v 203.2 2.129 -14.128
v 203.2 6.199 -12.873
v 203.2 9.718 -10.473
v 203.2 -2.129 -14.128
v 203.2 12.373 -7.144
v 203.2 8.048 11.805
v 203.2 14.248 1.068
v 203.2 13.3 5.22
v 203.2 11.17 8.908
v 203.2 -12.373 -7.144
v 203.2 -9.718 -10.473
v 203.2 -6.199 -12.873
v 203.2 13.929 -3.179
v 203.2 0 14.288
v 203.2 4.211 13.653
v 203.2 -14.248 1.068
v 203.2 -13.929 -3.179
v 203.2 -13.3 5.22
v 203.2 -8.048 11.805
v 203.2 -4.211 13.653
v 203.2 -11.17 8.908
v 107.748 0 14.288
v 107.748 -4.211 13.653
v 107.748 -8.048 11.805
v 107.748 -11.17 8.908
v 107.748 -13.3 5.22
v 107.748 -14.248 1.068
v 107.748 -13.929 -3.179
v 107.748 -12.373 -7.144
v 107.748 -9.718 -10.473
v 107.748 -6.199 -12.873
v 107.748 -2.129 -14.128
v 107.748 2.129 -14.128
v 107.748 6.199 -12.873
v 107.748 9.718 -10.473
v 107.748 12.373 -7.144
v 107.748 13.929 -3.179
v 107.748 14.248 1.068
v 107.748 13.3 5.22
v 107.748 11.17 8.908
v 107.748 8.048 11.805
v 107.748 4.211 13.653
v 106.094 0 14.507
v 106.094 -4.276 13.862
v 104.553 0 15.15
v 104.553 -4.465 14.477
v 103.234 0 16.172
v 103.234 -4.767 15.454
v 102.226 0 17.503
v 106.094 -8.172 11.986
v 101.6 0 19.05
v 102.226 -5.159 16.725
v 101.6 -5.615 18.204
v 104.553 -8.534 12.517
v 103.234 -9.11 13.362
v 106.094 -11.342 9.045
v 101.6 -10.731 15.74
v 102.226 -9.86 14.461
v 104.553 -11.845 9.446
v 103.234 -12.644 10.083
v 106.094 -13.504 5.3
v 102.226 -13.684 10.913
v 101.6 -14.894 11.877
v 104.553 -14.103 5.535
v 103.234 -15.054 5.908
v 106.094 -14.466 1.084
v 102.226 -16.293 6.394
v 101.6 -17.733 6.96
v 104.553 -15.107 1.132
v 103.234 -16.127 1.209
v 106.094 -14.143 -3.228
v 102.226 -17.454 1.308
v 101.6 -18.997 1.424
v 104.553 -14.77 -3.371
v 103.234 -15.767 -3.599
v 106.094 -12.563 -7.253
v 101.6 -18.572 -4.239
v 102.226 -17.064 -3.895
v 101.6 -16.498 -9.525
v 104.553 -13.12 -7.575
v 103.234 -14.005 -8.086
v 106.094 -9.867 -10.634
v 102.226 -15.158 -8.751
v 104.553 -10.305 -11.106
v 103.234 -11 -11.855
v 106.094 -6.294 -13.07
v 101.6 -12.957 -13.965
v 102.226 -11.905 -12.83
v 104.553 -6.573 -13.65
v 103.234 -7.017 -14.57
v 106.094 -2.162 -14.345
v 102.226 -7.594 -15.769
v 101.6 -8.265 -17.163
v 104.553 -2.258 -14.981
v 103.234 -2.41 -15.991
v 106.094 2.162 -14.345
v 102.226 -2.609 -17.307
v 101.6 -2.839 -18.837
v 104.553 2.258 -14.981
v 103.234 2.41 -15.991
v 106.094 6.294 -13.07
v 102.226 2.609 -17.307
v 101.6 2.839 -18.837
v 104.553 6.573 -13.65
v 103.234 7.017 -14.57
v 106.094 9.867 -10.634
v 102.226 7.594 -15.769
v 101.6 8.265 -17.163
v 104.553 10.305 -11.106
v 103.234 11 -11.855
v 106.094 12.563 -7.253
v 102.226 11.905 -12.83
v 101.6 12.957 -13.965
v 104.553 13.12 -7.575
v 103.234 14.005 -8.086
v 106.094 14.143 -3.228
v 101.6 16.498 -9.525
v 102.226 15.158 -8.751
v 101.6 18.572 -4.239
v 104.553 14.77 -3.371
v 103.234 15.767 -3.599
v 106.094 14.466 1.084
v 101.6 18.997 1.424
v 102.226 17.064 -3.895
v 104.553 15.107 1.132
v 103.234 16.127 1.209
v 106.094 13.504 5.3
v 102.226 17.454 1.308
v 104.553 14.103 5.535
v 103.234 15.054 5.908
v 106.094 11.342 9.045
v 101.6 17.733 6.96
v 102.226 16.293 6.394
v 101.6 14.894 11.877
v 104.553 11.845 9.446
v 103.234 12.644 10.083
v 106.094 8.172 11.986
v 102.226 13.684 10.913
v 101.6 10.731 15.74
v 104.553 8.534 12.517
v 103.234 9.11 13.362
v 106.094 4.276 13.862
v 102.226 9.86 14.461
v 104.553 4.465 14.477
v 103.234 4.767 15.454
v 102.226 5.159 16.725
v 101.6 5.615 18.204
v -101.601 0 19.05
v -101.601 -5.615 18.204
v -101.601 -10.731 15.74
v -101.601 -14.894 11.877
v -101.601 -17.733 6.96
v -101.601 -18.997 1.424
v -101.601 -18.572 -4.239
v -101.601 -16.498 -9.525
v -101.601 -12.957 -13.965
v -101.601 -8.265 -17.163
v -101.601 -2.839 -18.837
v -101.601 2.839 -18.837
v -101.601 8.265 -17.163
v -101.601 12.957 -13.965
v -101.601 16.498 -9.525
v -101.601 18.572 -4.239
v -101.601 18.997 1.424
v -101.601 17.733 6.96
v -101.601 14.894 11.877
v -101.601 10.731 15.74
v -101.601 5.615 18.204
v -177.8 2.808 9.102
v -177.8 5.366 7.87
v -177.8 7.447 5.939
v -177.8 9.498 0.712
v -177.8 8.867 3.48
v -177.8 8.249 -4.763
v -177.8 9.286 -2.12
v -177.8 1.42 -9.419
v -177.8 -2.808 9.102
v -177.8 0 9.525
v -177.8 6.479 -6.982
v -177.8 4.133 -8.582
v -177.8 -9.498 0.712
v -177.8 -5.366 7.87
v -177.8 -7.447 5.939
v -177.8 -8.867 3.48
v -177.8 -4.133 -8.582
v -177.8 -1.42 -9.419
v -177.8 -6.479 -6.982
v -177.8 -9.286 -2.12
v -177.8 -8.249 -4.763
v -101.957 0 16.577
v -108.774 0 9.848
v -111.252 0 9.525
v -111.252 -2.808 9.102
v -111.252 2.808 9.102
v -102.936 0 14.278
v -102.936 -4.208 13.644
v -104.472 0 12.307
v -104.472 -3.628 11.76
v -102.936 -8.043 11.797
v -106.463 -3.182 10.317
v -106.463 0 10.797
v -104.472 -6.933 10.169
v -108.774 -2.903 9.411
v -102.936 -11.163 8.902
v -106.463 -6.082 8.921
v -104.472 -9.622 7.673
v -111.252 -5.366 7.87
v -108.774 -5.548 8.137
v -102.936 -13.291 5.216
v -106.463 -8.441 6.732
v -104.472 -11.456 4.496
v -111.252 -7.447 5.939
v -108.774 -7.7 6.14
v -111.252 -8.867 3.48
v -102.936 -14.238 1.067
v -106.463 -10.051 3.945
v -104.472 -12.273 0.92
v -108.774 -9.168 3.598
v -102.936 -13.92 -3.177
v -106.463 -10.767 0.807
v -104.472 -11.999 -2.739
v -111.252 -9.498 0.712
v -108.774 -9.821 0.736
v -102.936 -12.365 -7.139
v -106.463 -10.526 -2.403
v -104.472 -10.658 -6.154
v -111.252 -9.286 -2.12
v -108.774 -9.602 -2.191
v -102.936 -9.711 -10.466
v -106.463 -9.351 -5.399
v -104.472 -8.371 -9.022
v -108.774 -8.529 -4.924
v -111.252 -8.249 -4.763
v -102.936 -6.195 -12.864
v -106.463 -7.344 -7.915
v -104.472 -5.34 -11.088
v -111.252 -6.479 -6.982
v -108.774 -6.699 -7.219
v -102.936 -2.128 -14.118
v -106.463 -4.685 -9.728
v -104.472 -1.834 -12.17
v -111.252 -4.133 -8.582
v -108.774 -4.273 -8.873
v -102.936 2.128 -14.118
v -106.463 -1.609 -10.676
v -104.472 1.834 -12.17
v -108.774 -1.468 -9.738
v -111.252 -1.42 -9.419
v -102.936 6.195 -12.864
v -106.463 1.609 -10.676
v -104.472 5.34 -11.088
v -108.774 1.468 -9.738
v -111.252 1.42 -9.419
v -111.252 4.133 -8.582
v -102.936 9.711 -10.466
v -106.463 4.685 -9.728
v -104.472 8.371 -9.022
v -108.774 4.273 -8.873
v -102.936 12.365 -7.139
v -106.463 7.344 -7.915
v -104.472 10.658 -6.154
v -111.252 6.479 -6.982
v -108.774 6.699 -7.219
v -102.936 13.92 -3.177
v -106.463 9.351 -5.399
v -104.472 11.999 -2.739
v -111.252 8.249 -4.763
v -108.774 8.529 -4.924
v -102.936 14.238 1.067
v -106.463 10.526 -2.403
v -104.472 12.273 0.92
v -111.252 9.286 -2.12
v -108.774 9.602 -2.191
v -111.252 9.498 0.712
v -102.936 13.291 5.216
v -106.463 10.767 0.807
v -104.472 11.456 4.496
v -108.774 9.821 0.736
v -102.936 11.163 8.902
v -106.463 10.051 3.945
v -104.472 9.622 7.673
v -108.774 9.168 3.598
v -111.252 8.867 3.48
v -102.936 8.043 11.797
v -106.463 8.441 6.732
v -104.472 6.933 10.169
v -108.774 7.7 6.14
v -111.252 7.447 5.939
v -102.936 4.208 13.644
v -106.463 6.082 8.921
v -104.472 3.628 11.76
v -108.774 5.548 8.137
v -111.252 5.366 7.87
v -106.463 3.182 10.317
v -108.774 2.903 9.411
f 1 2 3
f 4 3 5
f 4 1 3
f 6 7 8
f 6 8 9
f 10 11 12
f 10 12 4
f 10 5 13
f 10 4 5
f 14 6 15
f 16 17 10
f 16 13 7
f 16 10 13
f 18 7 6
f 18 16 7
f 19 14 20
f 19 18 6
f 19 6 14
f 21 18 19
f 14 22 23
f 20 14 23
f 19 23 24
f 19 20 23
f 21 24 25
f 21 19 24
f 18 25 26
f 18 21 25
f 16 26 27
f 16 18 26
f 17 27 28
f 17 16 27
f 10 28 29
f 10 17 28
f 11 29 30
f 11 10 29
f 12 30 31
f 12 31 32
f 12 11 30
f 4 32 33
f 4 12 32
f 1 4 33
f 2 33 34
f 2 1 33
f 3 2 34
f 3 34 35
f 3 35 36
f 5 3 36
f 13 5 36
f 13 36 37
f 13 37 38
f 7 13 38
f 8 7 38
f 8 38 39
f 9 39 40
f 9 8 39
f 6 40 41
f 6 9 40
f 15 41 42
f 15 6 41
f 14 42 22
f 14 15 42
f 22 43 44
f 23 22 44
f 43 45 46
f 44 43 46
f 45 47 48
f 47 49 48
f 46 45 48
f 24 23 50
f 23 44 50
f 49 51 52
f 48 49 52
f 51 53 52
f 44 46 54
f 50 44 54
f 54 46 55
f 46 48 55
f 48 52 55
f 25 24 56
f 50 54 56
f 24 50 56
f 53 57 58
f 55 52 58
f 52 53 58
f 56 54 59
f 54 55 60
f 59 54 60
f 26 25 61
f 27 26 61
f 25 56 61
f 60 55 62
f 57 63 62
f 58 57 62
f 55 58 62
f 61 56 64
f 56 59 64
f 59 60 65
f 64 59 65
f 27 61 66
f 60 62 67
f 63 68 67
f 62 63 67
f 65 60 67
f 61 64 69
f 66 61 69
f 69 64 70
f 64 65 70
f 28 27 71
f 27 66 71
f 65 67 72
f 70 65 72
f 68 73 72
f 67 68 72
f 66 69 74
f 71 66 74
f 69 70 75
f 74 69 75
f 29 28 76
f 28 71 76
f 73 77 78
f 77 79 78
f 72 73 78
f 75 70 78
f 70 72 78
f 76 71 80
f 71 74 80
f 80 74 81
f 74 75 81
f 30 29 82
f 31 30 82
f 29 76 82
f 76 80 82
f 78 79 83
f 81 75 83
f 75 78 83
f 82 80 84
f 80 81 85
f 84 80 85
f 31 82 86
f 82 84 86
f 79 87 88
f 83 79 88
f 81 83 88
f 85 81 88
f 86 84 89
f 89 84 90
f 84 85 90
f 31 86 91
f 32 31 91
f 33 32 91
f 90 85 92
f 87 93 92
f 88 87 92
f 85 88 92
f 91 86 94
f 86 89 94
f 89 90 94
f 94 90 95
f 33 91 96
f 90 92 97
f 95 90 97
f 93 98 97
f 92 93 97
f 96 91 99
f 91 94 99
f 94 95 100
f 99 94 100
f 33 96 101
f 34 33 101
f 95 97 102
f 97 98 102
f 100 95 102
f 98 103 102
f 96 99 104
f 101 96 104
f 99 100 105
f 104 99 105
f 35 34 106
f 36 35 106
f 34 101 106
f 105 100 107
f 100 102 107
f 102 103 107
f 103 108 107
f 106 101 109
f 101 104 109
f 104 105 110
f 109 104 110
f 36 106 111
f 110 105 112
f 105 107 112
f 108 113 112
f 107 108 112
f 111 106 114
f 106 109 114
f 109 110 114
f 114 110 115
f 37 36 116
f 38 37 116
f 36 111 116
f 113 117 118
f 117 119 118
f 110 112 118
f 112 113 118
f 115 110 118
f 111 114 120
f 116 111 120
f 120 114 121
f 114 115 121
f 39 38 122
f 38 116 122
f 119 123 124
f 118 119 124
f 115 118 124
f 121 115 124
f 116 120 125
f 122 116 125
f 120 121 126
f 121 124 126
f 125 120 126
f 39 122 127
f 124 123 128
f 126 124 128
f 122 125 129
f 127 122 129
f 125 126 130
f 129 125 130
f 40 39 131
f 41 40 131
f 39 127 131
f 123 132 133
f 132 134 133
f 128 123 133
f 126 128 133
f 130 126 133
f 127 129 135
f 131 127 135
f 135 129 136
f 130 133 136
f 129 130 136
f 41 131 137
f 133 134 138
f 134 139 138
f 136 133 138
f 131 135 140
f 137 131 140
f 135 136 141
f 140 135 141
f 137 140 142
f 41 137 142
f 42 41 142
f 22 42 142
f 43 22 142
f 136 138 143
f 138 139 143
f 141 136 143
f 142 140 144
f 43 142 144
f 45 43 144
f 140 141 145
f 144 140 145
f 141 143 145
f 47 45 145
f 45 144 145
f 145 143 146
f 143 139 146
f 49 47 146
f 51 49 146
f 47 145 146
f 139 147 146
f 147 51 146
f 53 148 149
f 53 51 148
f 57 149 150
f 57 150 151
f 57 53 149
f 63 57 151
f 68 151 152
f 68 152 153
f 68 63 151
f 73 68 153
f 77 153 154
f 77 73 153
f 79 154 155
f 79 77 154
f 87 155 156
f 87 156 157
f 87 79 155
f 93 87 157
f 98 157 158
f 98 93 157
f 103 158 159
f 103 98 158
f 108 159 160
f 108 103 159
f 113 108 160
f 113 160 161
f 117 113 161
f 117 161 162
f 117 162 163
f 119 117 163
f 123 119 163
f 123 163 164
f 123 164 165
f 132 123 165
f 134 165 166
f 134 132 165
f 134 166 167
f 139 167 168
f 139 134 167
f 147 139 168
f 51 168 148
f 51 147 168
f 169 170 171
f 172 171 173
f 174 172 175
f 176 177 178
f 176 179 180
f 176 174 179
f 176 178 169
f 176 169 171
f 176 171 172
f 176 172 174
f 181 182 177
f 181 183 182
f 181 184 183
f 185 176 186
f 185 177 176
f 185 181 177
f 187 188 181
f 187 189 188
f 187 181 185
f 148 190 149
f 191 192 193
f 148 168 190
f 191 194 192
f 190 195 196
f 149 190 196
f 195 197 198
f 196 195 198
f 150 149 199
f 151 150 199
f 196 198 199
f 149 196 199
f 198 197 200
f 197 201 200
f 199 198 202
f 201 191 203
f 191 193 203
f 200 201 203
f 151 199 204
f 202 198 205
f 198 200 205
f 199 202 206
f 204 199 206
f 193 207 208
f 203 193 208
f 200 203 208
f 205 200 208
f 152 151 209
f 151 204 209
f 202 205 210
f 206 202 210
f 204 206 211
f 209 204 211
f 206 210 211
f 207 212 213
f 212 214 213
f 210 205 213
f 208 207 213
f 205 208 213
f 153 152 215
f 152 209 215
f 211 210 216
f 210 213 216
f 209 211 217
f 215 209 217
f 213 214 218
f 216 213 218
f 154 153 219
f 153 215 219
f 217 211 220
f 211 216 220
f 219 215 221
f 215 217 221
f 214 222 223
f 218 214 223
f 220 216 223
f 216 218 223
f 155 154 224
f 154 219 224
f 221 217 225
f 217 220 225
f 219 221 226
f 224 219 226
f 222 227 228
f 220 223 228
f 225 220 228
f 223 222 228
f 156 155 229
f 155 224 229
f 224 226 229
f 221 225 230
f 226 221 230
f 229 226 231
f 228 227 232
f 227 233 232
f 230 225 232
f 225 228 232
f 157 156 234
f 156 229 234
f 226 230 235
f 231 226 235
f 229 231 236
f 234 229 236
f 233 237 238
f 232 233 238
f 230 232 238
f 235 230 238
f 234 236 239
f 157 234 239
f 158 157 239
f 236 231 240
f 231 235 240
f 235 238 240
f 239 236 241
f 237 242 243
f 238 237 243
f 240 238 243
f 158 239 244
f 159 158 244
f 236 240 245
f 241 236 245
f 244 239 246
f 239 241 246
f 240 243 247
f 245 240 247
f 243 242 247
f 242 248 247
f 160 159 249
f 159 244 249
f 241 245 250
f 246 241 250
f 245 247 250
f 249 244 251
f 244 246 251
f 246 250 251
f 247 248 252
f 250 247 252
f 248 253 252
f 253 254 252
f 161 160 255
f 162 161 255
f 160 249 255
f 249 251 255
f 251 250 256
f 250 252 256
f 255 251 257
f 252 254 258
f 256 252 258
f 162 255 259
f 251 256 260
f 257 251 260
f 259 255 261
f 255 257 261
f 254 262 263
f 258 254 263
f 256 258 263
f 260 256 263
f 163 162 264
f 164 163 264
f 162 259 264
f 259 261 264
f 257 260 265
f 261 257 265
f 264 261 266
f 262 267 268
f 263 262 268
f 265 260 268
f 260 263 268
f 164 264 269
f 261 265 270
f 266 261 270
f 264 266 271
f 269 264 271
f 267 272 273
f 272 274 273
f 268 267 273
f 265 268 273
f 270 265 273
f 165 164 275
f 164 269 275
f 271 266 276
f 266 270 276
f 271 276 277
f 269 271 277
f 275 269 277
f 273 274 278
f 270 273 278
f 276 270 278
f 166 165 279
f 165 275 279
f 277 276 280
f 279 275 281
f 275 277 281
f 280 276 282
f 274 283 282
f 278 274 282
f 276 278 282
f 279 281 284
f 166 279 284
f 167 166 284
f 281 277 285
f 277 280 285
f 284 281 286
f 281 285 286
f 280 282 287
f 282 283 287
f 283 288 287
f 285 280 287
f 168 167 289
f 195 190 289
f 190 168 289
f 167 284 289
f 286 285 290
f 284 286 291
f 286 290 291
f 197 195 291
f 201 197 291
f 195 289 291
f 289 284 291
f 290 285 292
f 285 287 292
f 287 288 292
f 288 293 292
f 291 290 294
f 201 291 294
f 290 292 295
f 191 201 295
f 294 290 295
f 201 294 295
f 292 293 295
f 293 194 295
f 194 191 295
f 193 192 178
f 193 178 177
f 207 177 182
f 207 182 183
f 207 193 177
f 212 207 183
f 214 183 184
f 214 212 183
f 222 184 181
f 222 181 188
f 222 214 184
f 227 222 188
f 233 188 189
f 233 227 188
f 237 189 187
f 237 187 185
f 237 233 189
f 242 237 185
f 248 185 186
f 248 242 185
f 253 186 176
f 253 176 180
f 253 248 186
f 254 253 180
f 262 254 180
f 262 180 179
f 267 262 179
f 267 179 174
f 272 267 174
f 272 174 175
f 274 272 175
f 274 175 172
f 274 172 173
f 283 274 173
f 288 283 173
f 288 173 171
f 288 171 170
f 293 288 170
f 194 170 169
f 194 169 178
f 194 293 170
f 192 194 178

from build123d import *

# Parameters (mm, degrees)
FILLET1_R = 9.652
FILLET2_R = 6.35


with BuildPart() as part:
    # Sketch1 → Revolve3 (revolve)
    with BuildSketch(Plane.XY, mode=Mode.PRIVATE) as revolve3_sk:
        Polygon((-101.6, 19.05), (101.6, 19.05), (101.6, 14.2875), (203.2, 14.2875), (203.2, 0), (-177.8, 0), (-177.8, 9.525), (-101.6, 9.525), align=None)
    revolve(revolve3_sk.sketch.rotate(Axis((-177.8, 0, 0), (1, 0, 0)), 90), axis=Axis((-177.8, 0, 0), (1, 0, 0)))

    # Fillet1
    # the kernel refuses this fillet: 9.652 mm, written as the material it adds along each edge
    with BuildSketch(Plane(origin=(-101.6, 0, 0), x_dir=(0, 0, 1), z_dir=(0, 1, 0))) as fillet1_piece_1_section:
        with BuildLine():
            CenterArc((9.525 + FILLET1_R, -FILLET1_R), FILLET1_R, 90, 90)
            Line((9.525 + FILLET1_R, 0), (9.525, 0))
            Line((9.525, 0), (9.525, -FILLET1_R))
        make_face()
    fillet1_piece_1 = revolve(axis=Axis((-101.6, 0, 0), (1, 0, 0)), mode=Mode.PRIVATE)
    fillet1_piece_1 = fillet1_piece_1 & Plane(origin=(-104.387487572, 0, 0), x_dir=(0, 0, 1), z_dir=(1, 0, 0)) * Cylinder(19.05, 77, mode=Mode.PRIVATE)
    add(fillet1_piece_1)

    # Fillet2
    # the kernel refuses this fillet: 6.35 mm, written as the material it adds along each edge
    with BuildSketch(Plane(origin=(101.6, 0, 0), x_dir=(0, 0, 1), z_dir=(0, 1, 0))) as fillet2_piece_1:
        with BuildLine():
            CenterArc((20.6375, 6.148361062), FILLET2_R, 180, 75.522487814)
            Line((14.2875, 6.148361062), (14.1605, 6.148361062))
            Line((14.1605, 6.148361062), (14.1605, 0))
            Line((14.1605, 0), (14.2875, -0.127))
            ThreePointArc((14.2875, -0.127), (16.66875, -0.127), (19.01825, -0.122967221))
            Line((19.01825, -0.122967221), (19.05, 0))
        make_face()
    revolve(axis=Axis((101.6, 0, 0), (1, 0, 0)))


solid = part.part
